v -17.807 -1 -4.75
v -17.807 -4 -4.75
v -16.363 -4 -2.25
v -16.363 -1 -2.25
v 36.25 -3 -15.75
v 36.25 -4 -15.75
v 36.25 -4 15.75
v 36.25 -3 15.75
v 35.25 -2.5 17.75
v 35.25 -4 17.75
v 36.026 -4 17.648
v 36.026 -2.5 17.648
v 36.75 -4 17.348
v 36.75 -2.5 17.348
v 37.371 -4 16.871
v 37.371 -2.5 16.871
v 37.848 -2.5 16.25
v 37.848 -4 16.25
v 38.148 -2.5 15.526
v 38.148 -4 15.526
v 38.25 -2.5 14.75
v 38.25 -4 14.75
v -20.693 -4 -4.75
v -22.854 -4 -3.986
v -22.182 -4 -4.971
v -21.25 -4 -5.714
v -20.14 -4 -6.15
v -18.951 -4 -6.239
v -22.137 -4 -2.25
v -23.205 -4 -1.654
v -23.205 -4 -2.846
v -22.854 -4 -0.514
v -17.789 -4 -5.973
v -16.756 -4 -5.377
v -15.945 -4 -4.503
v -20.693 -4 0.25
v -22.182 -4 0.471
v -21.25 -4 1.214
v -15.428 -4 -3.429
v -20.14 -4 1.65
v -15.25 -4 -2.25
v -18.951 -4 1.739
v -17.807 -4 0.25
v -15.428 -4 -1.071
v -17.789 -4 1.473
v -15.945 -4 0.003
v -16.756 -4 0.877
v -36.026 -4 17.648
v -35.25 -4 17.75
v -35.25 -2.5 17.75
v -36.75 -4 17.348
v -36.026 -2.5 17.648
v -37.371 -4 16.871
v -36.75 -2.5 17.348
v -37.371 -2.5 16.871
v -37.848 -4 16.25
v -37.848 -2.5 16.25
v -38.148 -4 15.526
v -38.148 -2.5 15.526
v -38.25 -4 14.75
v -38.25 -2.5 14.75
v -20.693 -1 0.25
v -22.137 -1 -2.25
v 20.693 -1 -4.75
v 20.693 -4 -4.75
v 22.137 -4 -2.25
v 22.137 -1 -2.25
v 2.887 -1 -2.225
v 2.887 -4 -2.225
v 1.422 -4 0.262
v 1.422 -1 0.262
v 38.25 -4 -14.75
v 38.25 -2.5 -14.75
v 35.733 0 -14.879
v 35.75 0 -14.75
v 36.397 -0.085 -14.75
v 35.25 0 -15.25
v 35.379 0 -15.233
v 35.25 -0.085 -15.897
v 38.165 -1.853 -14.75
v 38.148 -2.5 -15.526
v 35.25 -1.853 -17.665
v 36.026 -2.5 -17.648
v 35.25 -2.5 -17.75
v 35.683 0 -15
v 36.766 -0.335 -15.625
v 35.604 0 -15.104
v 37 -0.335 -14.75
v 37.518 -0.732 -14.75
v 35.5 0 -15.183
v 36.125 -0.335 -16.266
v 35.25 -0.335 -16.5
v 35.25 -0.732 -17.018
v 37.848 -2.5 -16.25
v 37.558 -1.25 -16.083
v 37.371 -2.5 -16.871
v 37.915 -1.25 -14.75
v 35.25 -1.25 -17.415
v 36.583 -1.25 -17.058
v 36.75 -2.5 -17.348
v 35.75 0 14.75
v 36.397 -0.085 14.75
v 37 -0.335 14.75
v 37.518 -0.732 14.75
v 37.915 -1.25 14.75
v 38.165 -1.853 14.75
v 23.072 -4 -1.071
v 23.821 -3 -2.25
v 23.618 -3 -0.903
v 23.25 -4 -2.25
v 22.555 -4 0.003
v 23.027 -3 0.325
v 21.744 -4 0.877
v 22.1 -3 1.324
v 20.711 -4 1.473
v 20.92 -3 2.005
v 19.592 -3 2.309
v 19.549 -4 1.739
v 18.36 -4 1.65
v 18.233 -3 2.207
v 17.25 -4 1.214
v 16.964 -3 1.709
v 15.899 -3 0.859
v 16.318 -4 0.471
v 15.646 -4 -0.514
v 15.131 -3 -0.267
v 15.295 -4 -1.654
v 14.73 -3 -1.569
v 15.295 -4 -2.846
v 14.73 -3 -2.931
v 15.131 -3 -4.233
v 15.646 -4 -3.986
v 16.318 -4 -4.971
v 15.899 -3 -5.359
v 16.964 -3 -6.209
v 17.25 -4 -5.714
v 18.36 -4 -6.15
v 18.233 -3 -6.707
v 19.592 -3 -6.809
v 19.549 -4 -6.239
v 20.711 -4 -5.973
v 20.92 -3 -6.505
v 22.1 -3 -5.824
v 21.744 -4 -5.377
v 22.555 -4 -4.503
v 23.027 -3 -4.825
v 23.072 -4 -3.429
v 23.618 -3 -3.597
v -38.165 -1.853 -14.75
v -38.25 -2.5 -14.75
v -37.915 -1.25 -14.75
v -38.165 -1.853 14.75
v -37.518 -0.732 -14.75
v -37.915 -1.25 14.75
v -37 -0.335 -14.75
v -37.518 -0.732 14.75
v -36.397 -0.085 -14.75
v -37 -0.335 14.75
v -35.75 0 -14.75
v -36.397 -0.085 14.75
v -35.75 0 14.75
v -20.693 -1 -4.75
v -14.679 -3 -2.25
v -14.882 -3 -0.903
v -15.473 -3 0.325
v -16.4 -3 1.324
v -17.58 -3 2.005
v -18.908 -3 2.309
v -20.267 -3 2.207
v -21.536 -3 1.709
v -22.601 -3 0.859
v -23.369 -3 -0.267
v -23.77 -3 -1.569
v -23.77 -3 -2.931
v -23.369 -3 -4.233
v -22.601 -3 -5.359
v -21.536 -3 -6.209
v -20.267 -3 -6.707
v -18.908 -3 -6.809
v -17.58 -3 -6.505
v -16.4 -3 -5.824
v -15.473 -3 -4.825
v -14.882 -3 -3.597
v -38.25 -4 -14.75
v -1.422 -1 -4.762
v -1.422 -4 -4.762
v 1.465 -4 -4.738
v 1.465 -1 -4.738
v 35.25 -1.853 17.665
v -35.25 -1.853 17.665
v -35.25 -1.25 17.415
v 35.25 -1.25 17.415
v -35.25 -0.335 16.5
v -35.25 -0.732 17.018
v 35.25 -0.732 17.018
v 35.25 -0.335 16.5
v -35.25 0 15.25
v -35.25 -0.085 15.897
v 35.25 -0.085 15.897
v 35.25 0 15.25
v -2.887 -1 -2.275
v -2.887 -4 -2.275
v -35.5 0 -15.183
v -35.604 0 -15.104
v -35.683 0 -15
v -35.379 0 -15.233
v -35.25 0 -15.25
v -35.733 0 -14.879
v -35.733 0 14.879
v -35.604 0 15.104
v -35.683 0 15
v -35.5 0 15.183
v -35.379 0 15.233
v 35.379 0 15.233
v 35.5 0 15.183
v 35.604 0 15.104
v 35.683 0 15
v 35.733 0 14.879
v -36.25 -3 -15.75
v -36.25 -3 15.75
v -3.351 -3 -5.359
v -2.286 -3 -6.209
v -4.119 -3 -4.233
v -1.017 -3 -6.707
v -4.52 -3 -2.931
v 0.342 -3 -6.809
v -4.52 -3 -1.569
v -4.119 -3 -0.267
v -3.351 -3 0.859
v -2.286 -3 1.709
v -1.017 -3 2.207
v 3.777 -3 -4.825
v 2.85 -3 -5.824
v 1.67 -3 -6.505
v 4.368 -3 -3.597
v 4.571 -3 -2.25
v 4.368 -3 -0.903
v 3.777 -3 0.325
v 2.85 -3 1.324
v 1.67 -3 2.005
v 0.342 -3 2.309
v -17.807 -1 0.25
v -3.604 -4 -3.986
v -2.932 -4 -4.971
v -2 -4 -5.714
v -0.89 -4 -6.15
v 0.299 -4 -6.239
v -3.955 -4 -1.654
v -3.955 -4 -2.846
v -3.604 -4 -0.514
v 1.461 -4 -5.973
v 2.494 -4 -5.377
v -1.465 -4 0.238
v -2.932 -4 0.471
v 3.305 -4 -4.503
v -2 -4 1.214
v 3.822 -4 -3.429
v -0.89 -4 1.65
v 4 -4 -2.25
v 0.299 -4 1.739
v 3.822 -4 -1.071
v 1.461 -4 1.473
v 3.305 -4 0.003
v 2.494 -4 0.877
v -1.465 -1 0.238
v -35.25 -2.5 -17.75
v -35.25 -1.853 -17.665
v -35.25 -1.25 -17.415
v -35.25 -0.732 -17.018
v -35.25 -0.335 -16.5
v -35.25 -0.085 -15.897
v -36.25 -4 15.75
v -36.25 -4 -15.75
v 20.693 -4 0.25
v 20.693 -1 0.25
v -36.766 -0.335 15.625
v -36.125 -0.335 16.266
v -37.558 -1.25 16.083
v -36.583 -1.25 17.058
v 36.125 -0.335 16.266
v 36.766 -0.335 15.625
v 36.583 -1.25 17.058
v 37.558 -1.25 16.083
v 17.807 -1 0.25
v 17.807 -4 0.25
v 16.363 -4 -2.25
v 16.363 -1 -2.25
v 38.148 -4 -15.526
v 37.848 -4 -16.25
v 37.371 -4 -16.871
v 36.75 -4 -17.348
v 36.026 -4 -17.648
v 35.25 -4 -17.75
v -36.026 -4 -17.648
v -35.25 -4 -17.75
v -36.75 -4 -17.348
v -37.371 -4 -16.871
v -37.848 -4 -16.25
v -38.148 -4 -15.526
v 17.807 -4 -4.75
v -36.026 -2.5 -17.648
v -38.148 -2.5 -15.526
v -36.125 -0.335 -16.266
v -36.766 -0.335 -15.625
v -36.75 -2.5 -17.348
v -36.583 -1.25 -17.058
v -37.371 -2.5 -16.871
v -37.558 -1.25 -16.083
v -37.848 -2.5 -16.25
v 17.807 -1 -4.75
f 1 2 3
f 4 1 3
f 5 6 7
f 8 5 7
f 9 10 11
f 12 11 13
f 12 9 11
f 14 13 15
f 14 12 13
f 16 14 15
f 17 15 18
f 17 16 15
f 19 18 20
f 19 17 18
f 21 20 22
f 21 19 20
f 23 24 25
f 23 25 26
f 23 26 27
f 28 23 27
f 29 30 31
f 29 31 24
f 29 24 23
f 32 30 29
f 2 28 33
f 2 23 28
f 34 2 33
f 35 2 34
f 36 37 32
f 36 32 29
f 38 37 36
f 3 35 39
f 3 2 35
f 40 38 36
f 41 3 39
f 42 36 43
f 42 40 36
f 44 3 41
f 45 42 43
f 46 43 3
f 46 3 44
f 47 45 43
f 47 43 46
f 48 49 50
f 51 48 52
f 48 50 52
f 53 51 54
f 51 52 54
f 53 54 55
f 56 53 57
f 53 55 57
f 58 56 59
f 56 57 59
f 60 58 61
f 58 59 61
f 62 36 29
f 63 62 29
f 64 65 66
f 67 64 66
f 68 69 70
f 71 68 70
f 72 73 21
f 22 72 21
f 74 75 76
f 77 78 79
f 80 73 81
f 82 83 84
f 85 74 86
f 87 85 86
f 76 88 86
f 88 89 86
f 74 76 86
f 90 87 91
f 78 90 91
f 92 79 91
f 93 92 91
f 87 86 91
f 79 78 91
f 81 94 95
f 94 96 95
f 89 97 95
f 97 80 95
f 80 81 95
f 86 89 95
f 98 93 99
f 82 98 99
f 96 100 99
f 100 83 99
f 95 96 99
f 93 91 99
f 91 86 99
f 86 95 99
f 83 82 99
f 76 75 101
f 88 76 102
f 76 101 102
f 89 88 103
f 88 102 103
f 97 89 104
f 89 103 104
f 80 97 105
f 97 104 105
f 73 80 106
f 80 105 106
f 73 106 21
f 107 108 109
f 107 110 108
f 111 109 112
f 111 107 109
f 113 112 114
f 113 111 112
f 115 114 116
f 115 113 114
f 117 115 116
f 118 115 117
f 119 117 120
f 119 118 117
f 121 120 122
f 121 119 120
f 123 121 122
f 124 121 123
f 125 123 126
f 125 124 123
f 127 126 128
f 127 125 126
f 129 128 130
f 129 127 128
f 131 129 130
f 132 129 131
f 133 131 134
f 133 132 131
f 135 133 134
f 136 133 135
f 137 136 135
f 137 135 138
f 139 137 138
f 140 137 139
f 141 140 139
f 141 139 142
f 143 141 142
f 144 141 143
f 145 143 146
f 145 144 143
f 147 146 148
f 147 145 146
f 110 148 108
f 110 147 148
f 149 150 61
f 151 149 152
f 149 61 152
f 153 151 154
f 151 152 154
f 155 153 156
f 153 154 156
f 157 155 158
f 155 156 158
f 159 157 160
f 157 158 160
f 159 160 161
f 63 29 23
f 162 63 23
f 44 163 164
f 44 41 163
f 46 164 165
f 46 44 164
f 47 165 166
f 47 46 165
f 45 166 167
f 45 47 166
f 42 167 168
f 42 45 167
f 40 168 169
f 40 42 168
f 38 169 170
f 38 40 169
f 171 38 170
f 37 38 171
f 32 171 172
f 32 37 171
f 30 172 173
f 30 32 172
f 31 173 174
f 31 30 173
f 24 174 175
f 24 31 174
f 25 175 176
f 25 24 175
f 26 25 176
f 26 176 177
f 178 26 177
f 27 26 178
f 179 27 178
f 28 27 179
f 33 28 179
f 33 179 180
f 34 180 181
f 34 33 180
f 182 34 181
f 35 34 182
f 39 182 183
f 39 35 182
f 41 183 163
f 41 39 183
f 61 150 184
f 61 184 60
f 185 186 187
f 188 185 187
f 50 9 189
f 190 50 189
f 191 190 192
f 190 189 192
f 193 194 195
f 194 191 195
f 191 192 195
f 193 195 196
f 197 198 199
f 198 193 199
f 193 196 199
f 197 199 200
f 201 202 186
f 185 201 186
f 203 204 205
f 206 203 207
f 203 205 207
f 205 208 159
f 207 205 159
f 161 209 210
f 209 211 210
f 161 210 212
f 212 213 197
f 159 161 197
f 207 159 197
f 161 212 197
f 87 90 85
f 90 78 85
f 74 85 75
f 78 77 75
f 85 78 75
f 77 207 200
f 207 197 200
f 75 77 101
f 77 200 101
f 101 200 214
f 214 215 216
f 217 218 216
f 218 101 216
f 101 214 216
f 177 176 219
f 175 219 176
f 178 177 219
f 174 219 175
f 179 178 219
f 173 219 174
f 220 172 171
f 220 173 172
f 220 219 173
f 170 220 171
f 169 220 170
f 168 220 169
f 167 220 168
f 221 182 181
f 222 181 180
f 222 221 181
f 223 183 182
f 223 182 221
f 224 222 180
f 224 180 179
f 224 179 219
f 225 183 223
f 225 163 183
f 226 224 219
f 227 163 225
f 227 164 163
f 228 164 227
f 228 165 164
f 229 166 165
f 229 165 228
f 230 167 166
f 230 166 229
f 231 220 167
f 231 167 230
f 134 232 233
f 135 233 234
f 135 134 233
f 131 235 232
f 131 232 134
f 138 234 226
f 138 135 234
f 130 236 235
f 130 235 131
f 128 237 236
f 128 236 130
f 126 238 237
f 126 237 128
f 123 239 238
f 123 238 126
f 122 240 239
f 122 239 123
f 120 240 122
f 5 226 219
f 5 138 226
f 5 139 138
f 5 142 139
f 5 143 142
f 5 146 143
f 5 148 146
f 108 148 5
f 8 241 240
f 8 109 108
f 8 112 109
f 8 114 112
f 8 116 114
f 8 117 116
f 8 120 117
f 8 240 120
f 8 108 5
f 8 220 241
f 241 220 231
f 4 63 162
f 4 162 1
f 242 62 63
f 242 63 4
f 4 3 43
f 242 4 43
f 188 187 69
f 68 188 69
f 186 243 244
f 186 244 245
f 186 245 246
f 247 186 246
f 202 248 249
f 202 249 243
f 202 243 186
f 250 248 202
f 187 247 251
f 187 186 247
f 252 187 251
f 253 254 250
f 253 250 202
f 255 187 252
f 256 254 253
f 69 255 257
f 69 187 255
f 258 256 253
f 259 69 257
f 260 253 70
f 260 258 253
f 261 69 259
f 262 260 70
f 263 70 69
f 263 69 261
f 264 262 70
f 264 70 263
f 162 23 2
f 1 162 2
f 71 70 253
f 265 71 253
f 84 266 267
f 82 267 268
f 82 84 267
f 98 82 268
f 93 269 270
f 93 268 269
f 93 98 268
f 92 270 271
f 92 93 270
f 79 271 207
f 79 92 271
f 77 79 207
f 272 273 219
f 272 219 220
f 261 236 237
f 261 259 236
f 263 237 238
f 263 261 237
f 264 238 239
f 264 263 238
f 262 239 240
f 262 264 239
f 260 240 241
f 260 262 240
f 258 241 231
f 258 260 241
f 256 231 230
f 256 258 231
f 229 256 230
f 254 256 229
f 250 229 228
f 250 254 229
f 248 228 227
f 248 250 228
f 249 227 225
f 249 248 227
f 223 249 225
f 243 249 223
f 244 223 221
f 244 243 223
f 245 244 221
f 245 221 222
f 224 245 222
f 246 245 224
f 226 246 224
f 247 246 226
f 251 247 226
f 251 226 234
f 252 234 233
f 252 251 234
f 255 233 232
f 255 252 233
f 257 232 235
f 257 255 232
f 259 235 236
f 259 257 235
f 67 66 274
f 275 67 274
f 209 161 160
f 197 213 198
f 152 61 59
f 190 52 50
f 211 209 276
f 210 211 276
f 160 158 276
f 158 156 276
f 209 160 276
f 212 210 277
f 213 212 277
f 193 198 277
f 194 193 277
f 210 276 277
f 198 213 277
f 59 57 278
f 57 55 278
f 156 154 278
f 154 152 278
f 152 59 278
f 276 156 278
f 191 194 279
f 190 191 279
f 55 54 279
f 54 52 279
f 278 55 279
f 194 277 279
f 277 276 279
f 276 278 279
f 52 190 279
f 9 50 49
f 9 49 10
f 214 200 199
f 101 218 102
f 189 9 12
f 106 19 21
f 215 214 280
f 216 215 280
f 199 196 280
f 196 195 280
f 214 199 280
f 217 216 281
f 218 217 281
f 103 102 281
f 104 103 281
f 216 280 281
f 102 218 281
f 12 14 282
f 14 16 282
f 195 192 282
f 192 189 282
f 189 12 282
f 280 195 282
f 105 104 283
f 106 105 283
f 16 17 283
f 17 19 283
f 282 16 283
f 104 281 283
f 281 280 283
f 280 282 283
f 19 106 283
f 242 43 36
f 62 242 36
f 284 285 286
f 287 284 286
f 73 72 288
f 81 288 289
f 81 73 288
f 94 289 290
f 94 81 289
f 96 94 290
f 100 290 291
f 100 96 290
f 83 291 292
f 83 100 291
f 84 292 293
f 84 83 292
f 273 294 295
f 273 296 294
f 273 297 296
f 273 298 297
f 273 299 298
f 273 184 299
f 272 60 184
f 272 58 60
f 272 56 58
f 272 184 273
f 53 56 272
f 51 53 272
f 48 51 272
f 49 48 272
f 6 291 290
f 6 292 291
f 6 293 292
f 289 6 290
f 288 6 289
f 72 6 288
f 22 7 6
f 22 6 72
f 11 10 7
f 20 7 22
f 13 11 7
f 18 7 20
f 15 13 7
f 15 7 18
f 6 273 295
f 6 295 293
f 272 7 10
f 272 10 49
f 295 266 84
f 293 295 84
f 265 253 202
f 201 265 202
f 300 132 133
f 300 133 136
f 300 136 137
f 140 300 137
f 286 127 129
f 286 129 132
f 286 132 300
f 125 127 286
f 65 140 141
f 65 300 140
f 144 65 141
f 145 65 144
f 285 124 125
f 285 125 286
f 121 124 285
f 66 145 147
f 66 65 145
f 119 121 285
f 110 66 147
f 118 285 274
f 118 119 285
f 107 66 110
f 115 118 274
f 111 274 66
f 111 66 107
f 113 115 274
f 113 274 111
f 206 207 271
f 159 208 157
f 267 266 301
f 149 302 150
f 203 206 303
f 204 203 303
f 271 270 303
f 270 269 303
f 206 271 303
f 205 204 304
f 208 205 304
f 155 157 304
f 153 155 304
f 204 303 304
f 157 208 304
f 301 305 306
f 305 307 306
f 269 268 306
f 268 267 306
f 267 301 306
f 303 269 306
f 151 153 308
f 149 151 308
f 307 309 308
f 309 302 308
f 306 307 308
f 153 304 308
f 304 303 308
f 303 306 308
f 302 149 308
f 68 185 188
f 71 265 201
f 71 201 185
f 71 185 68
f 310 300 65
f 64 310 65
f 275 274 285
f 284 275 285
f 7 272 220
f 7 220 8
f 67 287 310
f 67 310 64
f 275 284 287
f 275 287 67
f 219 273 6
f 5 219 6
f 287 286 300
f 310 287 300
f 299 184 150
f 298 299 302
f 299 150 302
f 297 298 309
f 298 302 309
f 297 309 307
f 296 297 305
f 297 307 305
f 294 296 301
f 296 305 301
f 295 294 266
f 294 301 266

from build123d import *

# Parameters (mm, degrees)
F0_W          = 76.5
F0_H          = 35.5
F1_DEPTH      = 4
F2_W          = 72.5
F2_H          = 31.5
F3_DEPTH      = 1
F5_R          = 6
F7_DEPTH      = 1
F6_R          = 6
F8_DEPTH      = 1
F13_DEPTH     = 3
F14_R         = 2.5
F15_T1_DEPTH  = 11.5
F15_T4_ANGLE  = 90
F15_T6_ANGLE  = 90
F15_T8_ANGLE  = 90
F15_T10_ANGLE = 90


# Not quite as in the source:
# - a fillet or chamfer that OpenCascade refuses, or shapes differently, is made with other operations: its cross-section is extruded or revolved along the edge and cut away or added


with BuildPart() as f1:
    # F0 (on Front) → F1 (new body)
    with BuildSketch(Plane.XZ):
        Rectangle(F0_W, F0_H)
    extrude(amount=F1_DEPTH)

    # F2 (on face) → F3 (cut)
    with BuildSketch(Plane.XZ.offset(4)):
        Rectangle(F2_W, F2_H)
    extrude(amount=-F3_DEPTH, mode=Mode.SUBTRACT)

    # F5 (on face) → F7 (join)
    with BuildSketch(Plane.XZ.offset(3)):
        with Locations((0, -2.25)):
            Circle(F5_R)
    extrude(amount=F7_DEPTH)

    # F6 (on face) → F8 (join)
    with BuildSketch(Plane.XZ.offset(3)):
        with Locations((19.25, -2.25)):
            Circle(F6_R)
        with Locations((-19.25, -2.25)):
            Circle(F6_R)
    extrude(amount=F8_DEPTH)

    # F9: chamfer of 2 x 3.5 on 3 edges, made by hand


with BuildPart() as f9_tool2:
    # F9_s3 → F9_t4 (revolve)
    with BuildSketch(Plane.XY.offset(-2.25)):
        Polygon((6, -0.5), (4, -4), (6, -4), align=None)
    revolve(axis=Axis((0, -4, -2.25), (0, -1, 0)))

    split(bisect_by=Plane.XZ.offset(3), keep=Keep.TOP)


with BuildPart() as f1_1:
    add(f1.part)

    # F9_t1: cut F9_tool2
    add(f9_tool2.part, mode=Mode.SUBTRACT)


with BuildPart() as f9_tool7:
    # F9_s8 → F9_t9 (revolve)
    with BuildSketch(Plane.XY.offset(-2.25)):
        Polygon((-13.25, -0.5), (-15.25, -4), (-13.25, -4), align=None)
    revolve(axis=Axis((-19.25, -4, -2.25), (0, -1, 0)))

    split(bisect_by=Plane.XZ.offset(3), keep=Keep.TOP)


with BuildPart() as f1_2:
    add(f1_1.part)

    # F9_t6: cut F9_tool7
    add(f9_tool7.part, mode=Mode.SUBTRACT)


with BuildPart() as f9_tool12:
    # F9_s13 → F9_t14 (revolve)
    with BuildSketch(Plane.XY.offset(-2.25)):
        Polygon((25.25, -0.5), (23.25, -4), (25.25, -4), align=None)
    revolve(axis=Axis((19.25, -4, -2.25), (0, -1, 0)))

    split(bisect_by=Plane.XZ.offset(3), keep=Keep.TOP)


with BuildPart() as f1_3:
    add(f1_2.part)

    # F9_t11: cut F9_tool12
    add(f9_tool12.part, mode=Mode.SUBTRACT)

    # F10 (on face) + F12 (on face) + F11 (on face) → F13 (cut)
    with BuildSketch(Plane.XZ.offset(4)):
        Polygon((-1.464609527, 0.2376197995), (-2.8866467048, -2.2745791573), (-1.4220371778, -4.7621989567), (1.464609527, -4.7376197995), (2.8866467048, -2.2254208427), (1.4220371778, 0.2621989567), align=None)
    with BuildSketch(Plane.XZ.offset(4)):
        Polygon((-17.806624327, 0.25), (-20.693375673, 0.25), (-22.1367513459, -2.25), (-20.693375673, -4.75), (-17.806624327, -4.75), (-16.3632486541, -2.25), align=None)
    with BuildSketch(Plane.XZ.offset(4)):
        Polygon((20.693375673, 0.25), (17.806624327, 0.25), (16.3632486541, -2.25), (17.806624327, -4.75), (20.693375673, -4.75), (22.1367513459, -2.25), align=None)
    extrude(amount=-F13_DEPTH, mode=Mode.SUBTRACT)

    # F14
    f14_edges = [f1_3.edges().sort_by_distance(p)[0] for p in [
        (0, 0, 17.75),
        (38.25, 0, 0),
        (0, 0, -17.75),
        (-38.25, 0, 0),
    ]]
    fillet(f14_edges, radius=F14_R)

    # F15: fillet of radius 3 on 8 edges, made by hand

    # F15_s2 → F15_t1 (cut)
    with BuildSketch(Plane.XZ):
        with BuildLine():
            ThreePointArc((35.25, 17.75), (37.3713203436, 16.8713203436), (38.25, 14.75))
            Line((38.25, 14.75), (38.25, 17.75))
            Line((38.25, 17.75), (35.25, 17.75))
        make_face()
        with BuildLine():
            ThreePointArc((38.25, -14.75), (37.3713203436, -16.8713203436), (35.25, -17.75))
            Line((35.25, -17.75), (38.25, -17.75))
            Line((38.25, -17.75), (38.25, -14.75))
        make_face()
        with BuildLine():
            ThreePointArc((-35.25, 17.75), (-37.3713203436, 16.8713203436), (-38.25, 14.75))
            Line((-38.25, 14.75), (-38.25, 17.75))
            Line((-38.25, 17.75), (-35.25, 17.75))
        make_face()
        with BuildLine():
            ThreePointArc((-38.25, -14.75), (-37.3713203436, -16.8713203436), (-35.25, -17.75))
            Line((-35.25, -17.75), (-38.25, -17.75))
            Line((-38.25, -17.75), (-38.25, -14.75))
        make_face()
    extrude(amount=F15_T1_DEPTH, mode=Mode.SUBTRACT)

    # F15_s3 → F15_t4 (revolve, cut)
    with BuildSketch(Plane.YZ.offset(35.25)):
        with BuildLine():
            ThreePointArc((0, 15.25), (-0.732233047, 17.017766953), (-2.5, 17.75))
            Line((-2.5, 17.75), (0, 17.75))
            Line((0, 17.75), (0, 15.25))
        make_face()
    revolve(axis=Axis((35.25, 0, 14.75), (0, 1, 0)), revolution_arc=F15_T4_ANGLE, mode=Mode.SUBTRACT)

    # F15_s5 → F15_t6 (revolve, cut)
    with BuildSketch(Plane.XY.offset(-14.75)):
        with BuildLine():
            ThreePointArc((35.75, 0), (37.517766953, -0.732233047), (38.25, -2.5))
            Line((38.25, -2.5), (38.25, 0))
            Line((38.25, 0), (35.75, 0))
        make_face()
    revolve(axis=Axis((35.25, 0, -14.75), (0, 1, 0)), revolution_arc=F15_T6_ANGLE, mode=Mode.SUBTRACT)

    # F15_s7 → F15_t8 (revolve, cut)
    with BuildSketch(Plane.XY.offset(14.75)):
        with BuildLine():
            ThreePointArc((-35.75, 0), (-37.517766953, -0.732233047), (-38.25, -2.5))
            Line((-38.25, -2.5), (-38.25, 0))
            Line((-38.25, 0), (-35.75, 0))
        make_face()
    revolve(axis=Axis((-35.25, 0, 14.75), (0, 1, 0)), revolution_arc=F15_T8_ANGLE, mode=Mode.SUBTRACT)

    # F15_s9 → F15_t10 (revolve, cut)
    with BuildSketch(Plane.YZ.offset(-35.25)):
        with BuildLine():
            ThreePointArc((0, -15.25), (-0.732233047, -17.017766953), (-2.5, -17.75))
            Line((-2.5, -17.75), (0, -17.75))
            Line((0, -17.75), (0, -15.25))
        make_face()
    revolve(axis=Axis((-35.25, 0, -14.75), (0, 1, 0)), revolution_arc=F15_T10_ANGLE, mode=Mode.SUBTRACT)


solid = f1_3.part
